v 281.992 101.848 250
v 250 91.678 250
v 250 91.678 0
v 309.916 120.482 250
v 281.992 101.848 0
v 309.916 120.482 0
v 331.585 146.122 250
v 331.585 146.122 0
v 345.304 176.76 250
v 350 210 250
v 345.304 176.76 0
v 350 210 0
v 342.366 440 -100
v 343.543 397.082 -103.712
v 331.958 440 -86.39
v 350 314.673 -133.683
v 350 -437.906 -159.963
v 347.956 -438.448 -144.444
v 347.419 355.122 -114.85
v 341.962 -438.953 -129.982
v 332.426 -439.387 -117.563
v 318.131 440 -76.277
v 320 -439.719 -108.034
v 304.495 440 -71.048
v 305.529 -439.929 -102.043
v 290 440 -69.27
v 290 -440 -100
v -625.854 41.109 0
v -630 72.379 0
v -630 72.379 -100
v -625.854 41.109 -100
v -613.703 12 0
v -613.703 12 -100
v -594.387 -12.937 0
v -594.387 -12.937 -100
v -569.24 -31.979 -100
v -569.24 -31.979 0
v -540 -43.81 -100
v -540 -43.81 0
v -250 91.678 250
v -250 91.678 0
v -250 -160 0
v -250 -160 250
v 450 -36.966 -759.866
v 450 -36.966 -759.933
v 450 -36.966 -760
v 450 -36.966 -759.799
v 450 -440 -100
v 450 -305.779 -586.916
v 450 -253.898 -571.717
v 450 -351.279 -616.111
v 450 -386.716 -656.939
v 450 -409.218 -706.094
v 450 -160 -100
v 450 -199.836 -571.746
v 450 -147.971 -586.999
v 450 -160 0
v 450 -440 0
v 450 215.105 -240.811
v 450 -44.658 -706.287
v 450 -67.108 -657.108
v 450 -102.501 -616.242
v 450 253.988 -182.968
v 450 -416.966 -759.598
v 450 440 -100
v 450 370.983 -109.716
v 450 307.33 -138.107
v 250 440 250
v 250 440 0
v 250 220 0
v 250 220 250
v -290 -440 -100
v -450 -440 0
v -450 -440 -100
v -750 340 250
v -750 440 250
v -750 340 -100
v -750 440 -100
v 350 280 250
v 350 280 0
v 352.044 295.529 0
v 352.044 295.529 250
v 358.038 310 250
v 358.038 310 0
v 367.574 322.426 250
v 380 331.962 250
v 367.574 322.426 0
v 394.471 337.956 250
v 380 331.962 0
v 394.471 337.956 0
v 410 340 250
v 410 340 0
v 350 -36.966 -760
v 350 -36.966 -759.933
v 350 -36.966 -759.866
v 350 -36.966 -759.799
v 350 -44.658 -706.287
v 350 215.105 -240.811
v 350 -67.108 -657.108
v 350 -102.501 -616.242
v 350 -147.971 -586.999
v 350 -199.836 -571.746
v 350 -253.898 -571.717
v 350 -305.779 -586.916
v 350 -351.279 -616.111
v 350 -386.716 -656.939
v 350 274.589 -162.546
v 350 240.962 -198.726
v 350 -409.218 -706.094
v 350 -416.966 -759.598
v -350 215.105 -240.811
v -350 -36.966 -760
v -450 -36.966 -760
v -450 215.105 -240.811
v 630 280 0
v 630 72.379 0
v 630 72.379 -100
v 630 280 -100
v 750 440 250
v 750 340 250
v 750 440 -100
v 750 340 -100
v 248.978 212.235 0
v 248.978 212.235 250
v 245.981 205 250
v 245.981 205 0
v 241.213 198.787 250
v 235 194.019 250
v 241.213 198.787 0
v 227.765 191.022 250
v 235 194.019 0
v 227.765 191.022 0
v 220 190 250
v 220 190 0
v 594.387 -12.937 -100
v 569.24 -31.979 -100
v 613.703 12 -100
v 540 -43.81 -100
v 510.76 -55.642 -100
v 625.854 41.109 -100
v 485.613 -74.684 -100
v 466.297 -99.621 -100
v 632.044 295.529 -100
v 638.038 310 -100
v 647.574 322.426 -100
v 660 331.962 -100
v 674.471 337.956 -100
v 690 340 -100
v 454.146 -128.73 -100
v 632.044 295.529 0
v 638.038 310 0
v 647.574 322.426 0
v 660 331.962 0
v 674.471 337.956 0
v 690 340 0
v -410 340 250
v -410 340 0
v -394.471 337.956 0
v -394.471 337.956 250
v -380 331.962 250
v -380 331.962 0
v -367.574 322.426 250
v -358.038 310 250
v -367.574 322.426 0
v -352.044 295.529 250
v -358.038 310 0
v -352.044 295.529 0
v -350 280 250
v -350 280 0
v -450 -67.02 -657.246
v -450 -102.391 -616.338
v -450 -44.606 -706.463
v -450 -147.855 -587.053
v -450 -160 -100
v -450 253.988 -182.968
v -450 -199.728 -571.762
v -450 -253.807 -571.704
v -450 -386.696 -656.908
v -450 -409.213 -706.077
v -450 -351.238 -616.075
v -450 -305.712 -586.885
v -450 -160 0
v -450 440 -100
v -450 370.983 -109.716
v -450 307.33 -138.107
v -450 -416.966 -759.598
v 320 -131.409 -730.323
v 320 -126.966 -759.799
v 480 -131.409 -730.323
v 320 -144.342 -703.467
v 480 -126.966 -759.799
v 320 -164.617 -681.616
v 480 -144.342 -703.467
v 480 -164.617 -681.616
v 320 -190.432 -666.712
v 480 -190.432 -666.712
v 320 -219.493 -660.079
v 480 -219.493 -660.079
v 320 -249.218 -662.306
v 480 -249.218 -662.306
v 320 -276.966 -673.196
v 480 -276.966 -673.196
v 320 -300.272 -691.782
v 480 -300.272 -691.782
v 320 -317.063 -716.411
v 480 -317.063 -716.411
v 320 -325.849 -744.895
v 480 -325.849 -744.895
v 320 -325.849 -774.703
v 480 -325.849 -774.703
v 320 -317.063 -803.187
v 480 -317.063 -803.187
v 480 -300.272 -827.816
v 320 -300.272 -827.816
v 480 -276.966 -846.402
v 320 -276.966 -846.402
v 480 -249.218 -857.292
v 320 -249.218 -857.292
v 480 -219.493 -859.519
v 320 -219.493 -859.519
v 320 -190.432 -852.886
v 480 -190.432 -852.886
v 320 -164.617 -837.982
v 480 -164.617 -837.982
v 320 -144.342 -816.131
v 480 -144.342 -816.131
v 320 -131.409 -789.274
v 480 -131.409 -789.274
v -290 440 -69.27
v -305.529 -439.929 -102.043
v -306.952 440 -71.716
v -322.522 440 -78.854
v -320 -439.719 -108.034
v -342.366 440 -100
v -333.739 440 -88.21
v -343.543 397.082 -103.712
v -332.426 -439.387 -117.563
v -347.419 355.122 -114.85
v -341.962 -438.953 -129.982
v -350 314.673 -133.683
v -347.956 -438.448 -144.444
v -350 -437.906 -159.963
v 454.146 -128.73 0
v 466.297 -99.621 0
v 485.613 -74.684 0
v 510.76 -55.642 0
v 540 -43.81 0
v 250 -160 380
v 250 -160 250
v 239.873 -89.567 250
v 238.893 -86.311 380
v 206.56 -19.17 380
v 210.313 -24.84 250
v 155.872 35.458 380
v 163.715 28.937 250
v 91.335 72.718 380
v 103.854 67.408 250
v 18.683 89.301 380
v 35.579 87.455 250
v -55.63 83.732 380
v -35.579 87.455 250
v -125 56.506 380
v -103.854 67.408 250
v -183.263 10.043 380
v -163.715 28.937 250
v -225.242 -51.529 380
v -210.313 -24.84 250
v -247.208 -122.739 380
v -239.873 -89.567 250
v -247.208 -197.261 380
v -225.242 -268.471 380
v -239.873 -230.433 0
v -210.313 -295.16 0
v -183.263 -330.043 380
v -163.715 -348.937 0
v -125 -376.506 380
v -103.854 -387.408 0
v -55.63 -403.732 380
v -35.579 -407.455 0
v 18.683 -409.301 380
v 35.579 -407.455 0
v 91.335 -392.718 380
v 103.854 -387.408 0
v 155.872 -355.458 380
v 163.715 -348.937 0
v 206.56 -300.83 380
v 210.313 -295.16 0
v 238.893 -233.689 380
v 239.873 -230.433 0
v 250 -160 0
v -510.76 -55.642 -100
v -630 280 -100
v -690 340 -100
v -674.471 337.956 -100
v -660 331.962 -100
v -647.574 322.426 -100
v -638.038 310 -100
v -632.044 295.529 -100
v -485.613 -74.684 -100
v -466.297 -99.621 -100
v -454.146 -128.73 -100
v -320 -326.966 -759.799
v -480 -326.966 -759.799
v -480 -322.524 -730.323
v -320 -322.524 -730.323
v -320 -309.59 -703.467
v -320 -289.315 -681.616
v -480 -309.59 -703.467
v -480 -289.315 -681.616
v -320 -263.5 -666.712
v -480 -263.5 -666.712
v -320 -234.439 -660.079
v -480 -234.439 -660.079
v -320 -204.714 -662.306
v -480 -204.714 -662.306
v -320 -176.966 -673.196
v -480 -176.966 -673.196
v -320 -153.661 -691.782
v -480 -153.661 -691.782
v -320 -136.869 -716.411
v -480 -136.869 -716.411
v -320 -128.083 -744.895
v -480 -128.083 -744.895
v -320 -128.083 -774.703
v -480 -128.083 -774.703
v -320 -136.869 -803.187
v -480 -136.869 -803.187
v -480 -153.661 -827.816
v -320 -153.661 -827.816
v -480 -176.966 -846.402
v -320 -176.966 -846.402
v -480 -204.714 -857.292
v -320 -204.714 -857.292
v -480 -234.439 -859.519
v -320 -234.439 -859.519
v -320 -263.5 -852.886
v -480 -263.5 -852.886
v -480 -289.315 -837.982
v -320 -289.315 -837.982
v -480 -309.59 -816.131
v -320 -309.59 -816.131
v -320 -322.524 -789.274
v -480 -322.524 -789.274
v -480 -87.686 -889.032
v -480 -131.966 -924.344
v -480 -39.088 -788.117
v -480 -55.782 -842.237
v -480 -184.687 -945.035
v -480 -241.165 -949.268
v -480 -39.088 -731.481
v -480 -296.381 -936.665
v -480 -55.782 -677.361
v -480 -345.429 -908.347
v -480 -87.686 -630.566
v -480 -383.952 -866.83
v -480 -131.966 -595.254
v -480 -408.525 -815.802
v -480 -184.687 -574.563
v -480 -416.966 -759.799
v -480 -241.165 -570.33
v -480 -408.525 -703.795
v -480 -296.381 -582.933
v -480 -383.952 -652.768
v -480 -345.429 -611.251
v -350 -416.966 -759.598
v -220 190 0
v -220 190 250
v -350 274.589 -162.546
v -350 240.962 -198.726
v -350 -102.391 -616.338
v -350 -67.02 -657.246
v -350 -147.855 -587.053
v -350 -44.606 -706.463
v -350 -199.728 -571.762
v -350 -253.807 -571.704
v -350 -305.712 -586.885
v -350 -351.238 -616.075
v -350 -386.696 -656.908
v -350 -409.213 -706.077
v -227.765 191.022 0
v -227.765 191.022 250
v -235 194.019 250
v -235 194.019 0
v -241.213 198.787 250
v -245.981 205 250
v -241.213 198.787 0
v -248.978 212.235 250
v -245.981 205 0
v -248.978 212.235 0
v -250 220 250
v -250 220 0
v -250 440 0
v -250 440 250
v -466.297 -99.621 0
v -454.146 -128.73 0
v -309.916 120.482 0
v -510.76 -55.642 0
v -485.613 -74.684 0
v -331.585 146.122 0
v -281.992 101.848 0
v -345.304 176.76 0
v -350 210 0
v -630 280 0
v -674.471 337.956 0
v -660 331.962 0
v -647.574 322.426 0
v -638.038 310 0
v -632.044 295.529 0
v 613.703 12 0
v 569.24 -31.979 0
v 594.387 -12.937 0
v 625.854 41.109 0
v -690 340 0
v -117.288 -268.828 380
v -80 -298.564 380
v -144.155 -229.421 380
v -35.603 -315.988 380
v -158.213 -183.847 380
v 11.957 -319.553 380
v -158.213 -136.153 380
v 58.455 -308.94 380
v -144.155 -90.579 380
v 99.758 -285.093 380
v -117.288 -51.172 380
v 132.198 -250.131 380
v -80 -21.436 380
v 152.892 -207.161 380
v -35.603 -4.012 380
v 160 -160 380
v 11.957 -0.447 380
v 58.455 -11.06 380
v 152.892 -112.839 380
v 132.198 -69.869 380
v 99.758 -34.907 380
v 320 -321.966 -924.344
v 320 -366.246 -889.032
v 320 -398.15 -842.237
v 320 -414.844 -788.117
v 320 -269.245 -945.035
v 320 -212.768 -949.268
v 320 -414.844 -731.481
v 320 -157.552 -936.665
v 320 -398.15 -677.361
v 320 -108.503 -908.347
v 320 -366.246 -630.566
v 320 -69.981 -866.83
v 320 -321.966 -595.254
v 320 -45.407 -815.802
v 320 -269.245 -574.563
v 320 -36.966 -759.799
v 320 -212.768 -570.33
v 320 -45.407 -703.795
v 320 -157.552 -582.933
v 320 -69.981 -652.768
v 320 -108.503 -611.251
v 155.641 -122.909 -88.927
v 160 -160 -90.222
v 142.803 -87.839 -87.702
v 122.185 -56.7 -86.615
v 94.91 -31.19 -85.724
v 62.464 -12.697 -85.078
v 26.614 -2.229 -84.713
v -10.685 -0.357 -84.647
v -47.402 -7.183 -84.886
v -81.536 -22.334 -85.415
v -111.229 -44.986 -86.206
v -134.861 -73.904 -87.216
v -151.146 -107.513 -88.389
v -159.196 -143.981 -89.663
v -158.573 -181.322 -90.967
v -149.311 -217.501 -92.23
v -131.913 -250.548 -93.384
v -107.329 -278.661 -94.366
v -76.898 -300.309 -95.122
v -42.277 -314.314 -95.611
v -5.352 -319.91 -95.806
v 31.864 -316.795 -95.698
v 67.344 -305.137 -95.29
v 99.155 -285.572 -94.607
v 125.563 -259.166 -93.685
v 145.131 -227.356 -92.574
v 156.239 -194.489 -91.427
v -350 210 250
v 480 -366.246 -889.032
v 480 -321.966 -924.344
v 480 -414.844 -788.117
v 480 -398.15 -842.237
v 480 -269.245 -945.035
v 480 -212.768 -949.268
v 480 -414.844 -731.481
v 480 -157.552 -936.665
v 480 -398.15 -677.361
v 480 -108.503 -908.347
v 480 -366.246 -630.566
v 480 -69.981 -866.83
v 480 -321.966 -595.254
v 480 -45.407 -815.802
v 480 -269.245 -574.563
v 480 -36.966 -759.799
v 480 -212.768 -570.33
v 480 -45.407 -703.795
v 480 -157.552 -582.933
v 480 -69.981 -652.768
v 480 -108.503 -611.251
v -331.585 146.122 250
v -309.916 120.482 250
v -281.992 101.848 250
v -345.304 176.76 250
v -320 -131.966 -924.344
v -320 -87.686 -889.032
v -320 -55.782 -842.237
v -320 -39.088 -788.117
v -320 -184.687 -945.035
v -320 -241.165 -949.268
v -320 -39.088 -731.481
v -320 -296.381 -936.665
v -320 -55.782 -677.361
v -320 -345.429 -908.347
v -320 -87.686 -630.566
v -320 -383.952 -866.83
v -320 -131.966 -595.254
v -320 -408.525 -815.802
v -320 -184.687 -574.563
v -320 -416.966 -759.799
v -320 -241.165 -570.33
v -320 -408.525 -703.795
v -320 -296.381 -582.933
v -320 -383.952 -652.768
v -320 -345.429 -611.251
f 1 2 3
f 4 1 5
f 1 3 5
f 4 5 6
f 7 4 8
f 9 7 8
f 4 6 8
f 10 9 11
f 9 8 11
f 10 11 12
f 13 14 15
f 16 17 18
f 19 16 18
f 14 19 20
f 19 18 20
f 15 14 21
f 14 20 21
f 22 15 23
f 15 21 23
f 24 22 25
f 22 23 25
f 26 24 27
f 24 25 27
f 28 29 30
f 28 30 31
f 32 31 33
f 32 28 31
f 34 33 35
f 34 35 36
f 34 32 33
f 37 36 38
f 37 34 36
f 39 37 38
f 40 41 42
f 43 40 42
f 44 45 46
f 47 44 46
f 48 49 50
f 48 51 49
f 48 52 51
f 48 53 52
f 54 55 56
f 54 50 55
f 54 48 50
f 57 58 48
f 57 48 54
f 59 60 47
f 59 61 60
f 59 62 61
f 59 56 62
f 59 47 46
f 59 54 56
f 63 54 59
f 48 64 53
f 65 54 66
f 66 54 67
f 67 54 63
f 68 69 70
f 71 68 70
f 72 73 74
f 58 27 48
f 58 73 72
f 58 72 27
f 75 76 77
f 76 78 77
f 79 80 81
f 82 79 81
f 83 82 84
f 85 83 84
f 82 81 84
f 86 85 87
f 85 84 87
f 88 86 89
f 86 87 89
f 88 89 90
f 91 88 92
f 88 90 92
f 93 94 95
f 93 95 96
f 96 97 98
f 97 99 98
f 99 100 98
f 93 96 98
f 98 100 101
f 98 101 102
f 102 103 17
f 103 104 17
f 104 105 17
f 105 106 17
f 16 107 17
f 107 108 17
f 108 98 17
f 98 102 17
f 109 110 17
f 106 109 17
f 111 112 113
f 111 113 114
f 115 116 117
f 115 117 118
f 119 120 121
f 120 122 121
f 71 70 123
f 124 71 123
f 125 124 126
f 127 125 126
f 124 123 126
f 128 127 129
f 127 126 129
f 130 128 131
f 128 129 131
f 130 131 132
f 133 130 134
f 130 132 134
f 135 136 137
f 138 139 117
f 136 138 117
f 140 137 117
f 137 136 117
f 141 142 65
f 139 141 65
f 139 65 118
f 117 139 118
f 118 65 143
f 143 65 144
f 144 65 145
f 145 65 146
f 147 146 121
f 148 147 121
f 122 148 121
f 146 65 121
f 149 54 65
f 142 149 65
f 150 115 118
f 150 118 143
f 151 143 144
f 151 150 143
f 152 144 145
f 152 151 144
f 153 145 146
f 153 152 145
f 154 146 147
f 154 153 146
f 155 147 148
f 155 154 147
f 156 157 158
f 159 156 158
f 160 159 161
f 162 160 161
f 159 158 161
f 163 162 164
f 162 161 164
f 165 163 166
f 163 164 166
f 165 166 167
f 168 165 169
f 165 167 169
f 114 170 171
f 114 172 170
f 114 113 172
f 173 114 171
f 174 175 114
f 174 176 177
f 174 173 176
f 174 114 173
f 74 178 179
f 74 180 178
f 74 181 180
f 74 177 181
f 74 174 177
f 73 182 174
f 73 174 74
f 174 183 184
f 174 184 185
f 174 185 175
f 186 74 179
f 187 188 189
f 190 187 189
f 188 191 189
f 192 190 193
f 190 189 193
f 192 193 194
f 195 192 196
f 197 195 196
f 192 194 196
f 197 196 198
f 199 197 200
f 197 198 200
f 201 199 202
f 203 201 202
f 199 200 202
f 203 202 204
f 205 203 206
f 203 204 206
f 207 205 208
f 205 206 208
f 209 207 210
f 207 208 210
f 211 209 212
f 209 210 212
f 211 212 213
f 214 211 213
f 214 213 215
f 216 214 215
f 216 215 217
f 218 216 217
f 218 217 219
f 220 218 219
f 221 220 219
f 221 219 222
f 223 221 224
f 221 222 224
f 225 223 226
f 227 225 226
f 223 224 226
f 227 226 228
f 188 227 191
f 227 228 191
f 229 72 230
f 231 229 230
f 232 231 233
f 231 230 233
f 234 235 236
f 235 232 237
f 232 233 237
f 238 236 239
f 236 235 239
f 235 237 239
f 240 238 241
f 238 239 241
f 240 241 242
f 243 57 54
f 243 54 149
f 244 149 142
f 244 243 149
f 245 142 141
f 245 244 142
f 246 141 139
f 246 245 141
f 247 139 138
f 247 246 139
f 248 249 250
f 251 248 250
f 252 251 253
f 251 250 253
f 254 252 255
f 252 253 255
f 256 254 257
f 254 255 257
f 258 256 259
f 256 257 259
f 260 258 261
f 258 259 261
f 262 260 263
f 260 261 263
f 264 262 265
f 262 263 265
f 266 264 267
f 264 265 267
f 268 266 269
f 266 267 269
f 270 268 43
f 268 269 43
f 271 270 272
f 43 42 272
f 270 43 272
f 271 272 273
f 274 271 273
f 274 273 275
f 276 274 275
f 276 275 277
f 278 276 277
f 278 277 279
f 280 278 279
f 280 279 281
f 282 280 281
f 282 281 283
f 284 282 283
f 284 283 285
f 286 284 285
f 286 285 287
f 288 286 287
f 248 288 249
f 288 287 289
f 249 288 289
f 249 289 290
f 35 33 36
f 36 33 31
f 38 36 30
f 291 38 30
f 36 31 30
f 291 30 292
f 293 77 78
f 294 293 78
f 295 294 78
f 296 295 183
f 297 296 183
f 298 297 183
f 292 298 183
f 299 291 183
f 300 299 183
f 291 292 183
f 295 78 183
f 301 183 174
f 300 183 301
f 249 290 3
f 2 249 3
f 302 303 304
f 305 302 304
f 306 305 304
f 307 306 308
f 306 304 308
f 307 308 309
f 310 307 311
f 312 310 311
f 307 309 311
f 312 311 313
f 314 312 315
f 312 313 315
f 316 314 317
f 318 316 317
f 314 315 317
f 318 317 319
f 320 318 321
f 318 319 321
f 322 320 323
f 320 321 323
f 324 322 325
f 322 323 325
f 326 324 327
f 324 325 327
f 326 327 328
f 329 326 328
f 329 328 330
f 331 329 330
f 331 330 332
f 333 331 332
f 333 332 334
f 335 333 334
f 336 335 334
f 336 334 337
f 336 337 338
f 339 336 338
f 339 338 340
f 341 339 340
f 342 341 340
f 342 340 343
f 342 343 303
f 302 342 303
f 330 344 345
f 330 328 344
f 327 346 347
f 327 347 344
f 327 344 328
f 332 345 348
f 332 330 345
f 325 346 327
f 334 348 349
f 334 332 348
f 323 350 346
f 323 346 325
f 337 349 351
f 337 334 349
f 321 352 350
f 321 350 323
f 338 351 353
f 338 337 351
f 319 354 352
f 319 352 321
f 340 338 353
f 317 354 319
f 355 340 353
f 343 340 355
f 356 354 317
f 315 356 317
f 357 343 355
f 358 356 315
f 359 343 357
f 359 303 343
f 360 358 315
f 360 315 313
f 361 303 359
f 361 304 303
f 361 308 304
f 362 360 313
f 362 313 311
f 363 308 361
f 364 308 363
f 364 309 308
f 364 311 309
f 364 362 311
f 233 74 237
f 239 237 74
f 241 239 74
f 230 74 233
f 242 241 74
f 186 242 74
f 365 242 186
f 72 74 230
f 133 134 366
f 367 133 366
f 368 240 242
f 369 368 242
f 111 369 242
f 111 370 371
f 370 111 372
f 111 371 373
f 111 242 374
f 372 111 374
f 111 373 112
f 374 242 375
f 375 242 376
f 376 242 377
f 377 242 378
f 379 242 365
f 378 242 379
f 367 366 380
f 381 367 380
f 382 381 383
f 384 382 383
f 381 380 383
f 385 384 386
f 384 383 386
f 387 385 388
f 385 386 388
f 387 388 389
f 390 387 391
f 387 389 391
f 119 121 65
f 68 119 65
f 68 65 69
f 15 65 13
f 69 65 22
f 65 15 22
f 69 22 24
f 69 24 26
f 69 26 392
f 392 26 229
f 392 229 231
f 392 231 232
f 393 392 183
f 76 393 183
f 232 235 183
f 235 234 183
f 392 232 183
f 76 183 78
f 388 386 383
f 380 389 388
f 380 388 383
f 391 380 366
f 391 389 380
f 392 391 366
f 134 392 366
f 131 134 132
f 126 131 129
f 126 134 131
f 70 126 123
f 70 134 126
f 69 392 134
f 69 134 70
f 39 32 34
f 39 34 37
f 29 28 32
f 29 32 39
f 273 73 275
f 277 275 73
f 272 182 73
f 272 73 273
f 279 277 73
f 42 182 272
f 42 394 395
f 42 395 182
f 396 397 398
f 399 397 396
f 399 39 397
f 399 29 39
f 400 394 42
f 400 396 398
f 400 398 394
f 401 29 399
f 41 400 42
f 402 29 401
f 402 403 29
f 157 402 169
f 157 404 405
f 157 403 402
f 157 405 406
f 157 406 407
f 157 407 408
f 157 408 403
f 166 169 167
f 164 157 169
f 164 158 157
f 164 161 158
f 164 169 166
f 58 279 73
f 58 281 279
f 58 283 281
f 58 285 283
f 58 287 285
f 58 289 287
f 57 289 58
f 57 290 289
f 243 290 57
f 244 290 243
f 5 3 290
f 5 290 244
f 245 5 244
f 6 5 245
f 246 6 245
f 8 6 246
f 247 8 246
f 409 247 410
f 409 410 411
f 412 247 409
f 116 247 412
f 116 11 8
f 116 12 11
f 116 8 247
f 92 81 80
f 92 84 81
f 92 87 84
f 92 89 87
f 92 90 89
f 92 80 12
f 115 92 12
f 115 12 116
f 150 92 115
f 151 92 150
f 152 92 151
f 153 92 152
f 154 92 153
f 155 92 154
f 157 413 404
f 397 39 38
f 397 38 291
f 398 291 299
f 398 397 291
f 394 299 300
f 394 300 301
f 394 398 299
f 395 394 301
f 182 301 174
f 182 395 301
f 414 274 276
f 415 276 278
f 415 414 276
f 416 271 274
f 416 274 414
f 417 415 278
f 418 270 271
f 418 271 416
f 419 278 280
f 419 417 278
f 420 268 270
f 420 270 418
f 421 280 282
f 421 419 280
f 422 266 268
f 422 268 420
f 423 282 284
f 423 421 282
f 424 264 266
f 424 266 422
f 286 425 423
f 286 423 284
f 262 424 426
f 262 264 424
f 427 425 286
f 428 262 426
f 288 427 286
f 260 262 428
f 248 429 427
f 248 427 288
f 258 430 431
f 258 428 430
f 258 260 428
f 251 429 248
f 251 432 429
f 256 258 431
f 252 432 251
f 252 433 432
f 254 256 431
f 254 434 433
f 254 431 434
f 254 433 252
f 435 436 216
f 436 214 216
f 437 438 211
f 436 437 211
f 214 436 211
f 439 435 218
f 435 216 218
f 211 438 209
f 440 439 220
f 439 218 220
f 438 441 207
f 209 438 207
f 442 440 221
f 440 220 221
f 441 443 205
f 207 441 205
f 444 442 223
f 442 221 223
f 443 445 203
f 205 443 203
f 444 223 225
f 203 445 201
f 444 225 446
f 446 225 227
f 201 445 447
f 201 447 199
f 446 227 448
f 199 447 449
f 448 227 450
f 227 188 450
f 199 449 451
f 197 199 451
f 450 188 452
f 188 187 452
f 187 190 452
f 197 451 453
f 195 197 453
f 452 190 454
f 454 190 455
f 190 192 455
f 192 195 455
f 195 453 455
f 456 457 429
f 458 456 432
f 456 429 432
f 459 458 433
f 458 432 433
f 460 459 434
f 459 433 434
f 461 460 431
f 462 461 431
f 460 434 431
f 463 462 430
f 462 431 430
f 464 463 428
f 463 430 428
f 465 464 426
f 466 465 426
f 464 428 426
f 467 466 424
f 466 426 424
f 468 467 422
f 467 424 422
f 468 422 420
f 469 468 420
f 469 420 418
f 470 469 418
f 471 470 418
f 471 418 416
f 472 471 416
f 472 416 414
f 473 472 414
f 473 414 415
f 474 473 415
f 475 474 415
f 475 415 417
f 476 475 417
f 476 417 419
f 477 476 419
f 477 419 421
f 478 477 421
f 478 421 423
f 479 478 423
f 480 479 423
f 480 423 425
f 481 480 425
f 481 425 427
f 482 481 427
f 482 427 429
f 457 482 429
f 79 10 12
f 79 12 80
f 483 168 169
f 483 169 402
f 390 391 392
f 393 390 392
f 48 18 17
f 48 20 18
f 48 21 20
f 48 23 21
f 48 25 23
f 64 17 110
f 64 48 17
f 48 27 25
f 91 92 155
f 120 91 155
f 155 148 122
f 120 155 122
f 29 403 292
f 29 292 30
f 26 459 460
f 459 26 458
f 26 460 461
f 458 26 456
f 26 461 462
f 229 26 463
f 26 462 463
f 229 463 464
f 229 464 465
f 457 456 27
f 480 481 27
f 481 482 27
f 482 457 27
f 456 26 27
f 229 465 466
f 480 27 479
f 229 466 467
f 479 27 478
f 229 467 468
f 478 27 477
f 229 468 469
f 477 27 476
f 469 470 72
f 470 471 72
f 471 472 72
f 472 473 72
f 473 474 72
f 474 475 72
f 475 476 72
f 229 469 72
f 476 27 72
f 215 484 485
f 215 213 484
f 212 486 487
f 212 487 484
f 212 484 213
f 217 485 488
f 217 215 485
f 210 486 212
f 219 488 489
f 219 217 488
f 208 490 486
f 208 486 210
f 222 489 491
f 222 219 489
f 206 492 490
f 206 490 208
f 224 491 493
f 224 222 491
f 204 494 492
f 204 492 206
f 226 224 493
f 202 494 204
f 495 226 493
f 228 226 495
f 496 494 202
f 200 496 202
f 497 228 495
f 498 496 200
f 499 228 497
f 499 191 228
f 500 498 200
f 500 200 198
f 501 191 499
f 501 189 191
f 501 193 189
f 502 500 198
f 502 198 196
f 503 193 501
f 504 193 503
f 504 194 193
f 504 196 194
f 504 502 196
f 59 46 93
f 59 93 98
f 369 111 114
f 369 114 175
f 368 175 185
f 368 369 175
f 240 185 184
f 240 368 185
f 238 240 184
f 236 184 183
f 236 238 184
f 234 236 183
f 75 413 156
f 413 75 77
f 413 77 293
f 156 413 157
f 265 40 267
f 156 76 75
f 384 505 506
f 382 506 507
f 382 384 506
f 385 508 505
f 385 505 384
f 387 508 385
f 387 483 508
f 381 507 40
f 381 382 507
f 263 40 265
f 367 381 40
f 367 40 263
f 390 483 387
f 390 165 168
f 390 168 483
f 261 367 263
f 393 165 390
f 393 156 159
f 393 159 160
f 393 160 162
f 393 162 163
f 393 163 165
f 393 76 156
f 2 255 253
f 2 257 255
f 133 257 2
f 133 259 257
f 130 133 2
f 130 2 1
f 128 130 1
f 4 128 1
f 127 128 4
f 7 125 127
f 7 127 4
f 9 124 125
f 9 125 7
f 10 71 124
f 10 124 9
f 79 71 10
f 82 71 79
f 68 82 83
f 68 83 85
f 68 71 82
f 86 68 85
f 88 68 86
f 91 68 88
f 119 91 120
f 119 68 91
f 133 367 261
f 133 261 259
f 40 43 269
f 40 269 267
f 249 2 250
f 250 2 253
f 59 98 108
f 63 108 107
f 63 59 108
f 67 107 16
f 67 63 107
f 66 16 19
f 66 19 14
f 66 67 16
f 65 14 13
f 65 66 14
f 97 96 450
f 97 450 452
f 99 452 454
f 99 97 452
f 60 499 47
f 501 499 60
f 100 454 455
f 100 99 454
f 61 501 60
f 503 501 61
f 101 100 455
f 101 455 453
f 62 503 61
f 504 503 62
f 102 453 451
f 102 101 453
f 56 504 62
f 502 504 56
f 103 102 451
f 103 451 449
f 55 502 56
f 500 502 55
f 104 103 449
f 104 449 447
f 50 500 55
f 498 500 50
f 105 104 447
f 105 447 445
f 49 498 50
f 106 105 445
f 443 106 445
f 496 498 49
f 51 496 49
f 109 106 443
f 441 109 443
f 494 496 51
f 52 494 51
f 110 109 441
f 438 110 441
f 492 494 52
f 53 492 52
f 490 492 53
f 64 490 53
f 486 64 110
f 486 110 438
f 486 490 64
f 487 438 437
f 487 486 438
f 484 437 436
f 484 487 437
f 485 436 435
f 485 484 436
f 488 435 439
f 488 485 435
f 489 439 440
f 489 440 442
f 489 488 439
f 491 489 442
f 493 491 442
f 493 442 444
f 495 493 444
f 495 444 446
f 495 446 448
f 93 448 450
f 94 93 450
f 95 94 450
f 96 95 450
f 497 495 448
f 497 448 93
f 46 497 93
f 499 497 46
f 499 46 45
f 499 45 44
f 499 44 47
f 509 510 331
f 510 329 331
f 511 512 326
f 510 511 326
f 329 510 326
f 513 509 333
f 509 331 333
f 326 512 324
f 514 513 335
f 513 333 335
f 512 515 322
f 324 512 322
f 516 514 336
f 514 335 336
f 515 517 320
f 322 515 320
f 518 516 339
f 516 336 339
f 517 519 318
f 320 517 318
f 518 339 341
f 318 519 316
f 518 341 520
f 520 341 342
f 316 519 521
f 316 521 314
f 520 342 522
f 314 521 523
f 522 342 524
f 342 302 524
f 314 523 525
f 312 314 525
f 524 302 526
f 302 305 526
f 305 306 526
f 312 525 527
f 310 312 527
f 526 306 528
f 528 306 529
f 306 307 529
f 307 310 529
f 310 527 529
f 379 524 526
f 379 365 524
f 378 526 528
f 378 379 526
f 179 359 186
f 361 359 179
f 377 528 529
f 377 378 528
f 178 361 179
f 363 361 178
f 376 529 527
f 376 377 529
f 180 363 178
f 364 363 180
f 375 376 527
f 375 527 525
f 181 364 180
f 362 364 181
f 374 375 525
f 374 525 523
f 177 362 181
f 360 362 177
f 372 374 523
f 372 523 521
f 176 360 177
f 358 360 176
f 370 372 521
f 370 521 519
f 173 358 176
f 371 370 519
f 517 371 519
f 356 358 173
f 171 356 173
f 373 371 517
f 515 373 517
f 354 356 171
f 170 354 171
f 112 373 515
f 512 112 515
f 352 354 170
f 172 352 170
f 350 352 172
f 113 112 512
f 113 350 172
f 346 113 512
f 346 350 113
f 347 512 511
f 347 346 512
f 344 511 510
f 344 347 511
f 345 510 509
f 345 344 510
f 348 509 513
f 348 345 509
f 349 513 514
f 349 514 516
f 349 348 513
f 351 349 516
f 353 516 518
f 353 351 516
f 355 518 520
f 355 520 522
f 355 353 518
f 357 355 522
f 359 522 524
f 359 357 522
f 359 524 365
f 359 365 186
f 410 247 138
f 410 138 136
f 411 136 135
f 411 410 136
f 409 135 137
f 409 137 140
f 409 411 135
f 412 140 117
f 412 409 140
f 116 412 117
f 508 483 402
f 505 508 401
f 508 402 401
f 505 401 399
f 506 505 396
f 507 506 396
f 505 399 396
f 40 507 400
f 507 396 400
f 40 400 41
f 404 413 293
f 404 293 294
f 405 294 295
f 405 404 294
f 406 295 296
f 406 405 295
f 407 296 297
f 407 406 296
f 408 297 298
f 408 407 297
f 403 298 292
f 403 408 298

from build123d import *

# Parameters (mm, degrees)
F1_DEPTH  = 100
F5_DEPTH  = 250
F7_DEPTH  = 130
F8_R      = 160
F9_DEPTH  = 480.001
F11_DEPTH = 900
F13_DEPTH = 896.216686194
F15_R     = 190
F15_R_2   = 100
F16_DEPTH = 160
F17_DEPTH = 1230.001
F19_R     = 190
F19_R_2   = 100
F20_DEPTH = 160


with BuildPart() as f1:
    # F0 (on Top) → F1 (new body)
    with BuildSketch(Plane.XY):
        with BuildLine():
            Line((750, 440), (-750, 440))
            Line((-750, 440), (-750, 340))
            Line((-750, 340), (-690, 340))
            ThreePointArc((-690, 340), (-647.5735931288, 322.4264068712), (-630, 280))
            Line((-630, 280), (-630, 72.3790007724))
            ThreePointArc((-630, 72.3790007724), (-604.8683298051, -1.1056915111), (-540, -43.8104996138))
            ThreePointArc((-540, -43.8104996138), (-475.1316701949, -86.5153077165), (-450, -160))
            Line((-450, -160), (-450, -440))
            Line((-450, -440), (450, -440))
            Line((450, -440), (450, -160))
            ThreePointArc((450, -160), (475.1316701949, -86.5153077165), (540, -43.8104996138))
            ThreePointArc((540, -43.8104996138), (604.8683298051, -1.1056915111), (630, 72.3790007724))
            Line((630, 72.3790007724), (630, 280))
            ThreePointArc((630, 280), (647.5735931288, 322.4264068712), (690, 340))
            Line((690, 340), (750, 340))
            Line((750, 340), (750, 440))
        make_face()
    extrude(amount=-F1_DEPTH)

    # F4 (on face) → F5 (join)
    with BuildSketch(Plane.XY):
        with BuildLine():
            Line((410, 340), (750, 340))
            Line((750, 340), (750, 440))
            Line((750, 440), (250, 440))
            Line((250, 440), (250, 220))
            ThreePointArc((250, 220), (241.2132034356, 198.7867965644), (220, 190))
            Line((220, 190), (0, 190))
            Line((0, 190), (-220, 190))
            ThreePointArc((-220, 190), (-241.2132034356, 198.7867965644), (-250, 220))
            Line((-250, 220), (-250, 440))
            Line((-250, 440), (-750, 440))
            Line((-750, 440), (-750, 340))
            Line((-750, 340), (-410, 340))
            ThreePointArc((-410, 340), (-367.5735931288, 322.4264068712), (-350, 280))
            Line((-350, 280), (-350, 210))
            ThreePointArc((-350, 210), (-321.6515138991, 132.5403330759), (-250, 91.678404338))
            Line((-250, 91.678404338), (-250, -160))
            ThreePointArc((-250, -160), (0, -410), (250, -160))
            Line((250, -160), (250, 91.678404338))
            ThreePointArc((250, 91.678404338), (321.6515138991, 132.5403330759), (350, 210))
            Line((350, 210), (350, 280))
            ThreePointArc((350, 280), (367.5735931288, 322.4264068712), (410, 340))
        make_face()
    extrude(amount=F5_DEPTH)

    # F6 (on face) → F7 (join)
    with BuildSketch(Plane.XY.offset(250)):
        with BuildLine():
            ThreePointArc((-250, -160), (0, -410), (250, -160))
            ThreePointArc((250, -160), (0, 90), (-250, -160))
        make_face()
    extrude(amount=F7_DEPTH)

    # F8 (on face) → F9 (cut, through all)
    with BuildSketch(Plane.XY.offset(380)):
        with Locations((0, -160)):
            Circle(F8_R)
    extrude(amount=-F9_DEPTH, mode=Mode.SUBTRACT)

    # F10 (on offset) → F11 (join)
    with BuildSketch(Plane.YZ.offset(450)):
        with BuildLine():
            Line((440, -100), (-440, -100))
            Line((-440, -100), (-416.9663321763, -759.5979458326))
            Line((-416.9663321763, -759.5979458326), (-36.9663321763, -760))
            Line((-36.9663321763, -760), (215.1048871839, -240.8112266237))
            ThreePointArc((215.1048871839, -240.8112266237), (307.3297195, -138.1071103788), (440, -100))
        make_face()
    extrude(amount=-F11_DEPTH)

    # F12 (on face) → F13 (cut, through all)
    with BuildSketch(Plane(origin=(0, -442.9519147444, -15.4682217107), x_dir=(1, 0, 0), z_dir=(0, -0.999390827, -0.0348994967))):
        with BuildLine():
            Line((-350, -144.5833041528), (-350, -864.5833041528))
            Line((-350, -864.5833041528), (350, -864.5833041528))
            Line((350, -864.5833041528), (350, -144.5833041528))
            ThreePointArc((350, -144.5833041528), (332.4264068712, -102.1568972816), (290, -84.5833041528))
            Line((290, -84.5833041528), (-290, -84.5833041528))
            ThreePointArc((-290, -84.5833041528), (-332.4264068712, -102.1568972816), (-350, -144.5833041528))
        make_face()
    extrude(amount=-F13_DEPTH, mode=Mode.SUBTRACT)

    # F15 (on offset) → F16 (join)
    with BuildSketch(Plane.YZ.offset(480)):
        with Locations((-226.9663321763, -759.7989729163)):
            Circle(F15_R)
        with Locations((-226.9663321763, -759.7989729163)):
            Circle(F15_R_2, mode=Mode.SUBTRACT)
    extrude(amount=-F16_DEPTH)

    # F15 (on offset) → F17 (cut, through all)
    with BuildSketch(Plane.YZ.offset(480)):
        with Locations((-226.9663321763, -759.7989729163)):
            Circle(F15_R_2)
    extrude(amount=-F17_DEPTH, mode=Mode.SUBTRACT)

    # F19 (on offset) → F20 (join)
    with BuildSketch(Plane(origin=(-480, 0, 0), x_dir=(0, -1, 0), z_dir=(-1, 0, 0))):
        with Locations((226.9663321763, -759.7989729163)):
            Circle(F19_R)
        with Locations((226.9663321763, -759.7989729163)):
            Circle(F19_R_2, mode=Mode.SUBTRACT)
    extrude(amount=-F20_DEPTH)


solid = f1.part
